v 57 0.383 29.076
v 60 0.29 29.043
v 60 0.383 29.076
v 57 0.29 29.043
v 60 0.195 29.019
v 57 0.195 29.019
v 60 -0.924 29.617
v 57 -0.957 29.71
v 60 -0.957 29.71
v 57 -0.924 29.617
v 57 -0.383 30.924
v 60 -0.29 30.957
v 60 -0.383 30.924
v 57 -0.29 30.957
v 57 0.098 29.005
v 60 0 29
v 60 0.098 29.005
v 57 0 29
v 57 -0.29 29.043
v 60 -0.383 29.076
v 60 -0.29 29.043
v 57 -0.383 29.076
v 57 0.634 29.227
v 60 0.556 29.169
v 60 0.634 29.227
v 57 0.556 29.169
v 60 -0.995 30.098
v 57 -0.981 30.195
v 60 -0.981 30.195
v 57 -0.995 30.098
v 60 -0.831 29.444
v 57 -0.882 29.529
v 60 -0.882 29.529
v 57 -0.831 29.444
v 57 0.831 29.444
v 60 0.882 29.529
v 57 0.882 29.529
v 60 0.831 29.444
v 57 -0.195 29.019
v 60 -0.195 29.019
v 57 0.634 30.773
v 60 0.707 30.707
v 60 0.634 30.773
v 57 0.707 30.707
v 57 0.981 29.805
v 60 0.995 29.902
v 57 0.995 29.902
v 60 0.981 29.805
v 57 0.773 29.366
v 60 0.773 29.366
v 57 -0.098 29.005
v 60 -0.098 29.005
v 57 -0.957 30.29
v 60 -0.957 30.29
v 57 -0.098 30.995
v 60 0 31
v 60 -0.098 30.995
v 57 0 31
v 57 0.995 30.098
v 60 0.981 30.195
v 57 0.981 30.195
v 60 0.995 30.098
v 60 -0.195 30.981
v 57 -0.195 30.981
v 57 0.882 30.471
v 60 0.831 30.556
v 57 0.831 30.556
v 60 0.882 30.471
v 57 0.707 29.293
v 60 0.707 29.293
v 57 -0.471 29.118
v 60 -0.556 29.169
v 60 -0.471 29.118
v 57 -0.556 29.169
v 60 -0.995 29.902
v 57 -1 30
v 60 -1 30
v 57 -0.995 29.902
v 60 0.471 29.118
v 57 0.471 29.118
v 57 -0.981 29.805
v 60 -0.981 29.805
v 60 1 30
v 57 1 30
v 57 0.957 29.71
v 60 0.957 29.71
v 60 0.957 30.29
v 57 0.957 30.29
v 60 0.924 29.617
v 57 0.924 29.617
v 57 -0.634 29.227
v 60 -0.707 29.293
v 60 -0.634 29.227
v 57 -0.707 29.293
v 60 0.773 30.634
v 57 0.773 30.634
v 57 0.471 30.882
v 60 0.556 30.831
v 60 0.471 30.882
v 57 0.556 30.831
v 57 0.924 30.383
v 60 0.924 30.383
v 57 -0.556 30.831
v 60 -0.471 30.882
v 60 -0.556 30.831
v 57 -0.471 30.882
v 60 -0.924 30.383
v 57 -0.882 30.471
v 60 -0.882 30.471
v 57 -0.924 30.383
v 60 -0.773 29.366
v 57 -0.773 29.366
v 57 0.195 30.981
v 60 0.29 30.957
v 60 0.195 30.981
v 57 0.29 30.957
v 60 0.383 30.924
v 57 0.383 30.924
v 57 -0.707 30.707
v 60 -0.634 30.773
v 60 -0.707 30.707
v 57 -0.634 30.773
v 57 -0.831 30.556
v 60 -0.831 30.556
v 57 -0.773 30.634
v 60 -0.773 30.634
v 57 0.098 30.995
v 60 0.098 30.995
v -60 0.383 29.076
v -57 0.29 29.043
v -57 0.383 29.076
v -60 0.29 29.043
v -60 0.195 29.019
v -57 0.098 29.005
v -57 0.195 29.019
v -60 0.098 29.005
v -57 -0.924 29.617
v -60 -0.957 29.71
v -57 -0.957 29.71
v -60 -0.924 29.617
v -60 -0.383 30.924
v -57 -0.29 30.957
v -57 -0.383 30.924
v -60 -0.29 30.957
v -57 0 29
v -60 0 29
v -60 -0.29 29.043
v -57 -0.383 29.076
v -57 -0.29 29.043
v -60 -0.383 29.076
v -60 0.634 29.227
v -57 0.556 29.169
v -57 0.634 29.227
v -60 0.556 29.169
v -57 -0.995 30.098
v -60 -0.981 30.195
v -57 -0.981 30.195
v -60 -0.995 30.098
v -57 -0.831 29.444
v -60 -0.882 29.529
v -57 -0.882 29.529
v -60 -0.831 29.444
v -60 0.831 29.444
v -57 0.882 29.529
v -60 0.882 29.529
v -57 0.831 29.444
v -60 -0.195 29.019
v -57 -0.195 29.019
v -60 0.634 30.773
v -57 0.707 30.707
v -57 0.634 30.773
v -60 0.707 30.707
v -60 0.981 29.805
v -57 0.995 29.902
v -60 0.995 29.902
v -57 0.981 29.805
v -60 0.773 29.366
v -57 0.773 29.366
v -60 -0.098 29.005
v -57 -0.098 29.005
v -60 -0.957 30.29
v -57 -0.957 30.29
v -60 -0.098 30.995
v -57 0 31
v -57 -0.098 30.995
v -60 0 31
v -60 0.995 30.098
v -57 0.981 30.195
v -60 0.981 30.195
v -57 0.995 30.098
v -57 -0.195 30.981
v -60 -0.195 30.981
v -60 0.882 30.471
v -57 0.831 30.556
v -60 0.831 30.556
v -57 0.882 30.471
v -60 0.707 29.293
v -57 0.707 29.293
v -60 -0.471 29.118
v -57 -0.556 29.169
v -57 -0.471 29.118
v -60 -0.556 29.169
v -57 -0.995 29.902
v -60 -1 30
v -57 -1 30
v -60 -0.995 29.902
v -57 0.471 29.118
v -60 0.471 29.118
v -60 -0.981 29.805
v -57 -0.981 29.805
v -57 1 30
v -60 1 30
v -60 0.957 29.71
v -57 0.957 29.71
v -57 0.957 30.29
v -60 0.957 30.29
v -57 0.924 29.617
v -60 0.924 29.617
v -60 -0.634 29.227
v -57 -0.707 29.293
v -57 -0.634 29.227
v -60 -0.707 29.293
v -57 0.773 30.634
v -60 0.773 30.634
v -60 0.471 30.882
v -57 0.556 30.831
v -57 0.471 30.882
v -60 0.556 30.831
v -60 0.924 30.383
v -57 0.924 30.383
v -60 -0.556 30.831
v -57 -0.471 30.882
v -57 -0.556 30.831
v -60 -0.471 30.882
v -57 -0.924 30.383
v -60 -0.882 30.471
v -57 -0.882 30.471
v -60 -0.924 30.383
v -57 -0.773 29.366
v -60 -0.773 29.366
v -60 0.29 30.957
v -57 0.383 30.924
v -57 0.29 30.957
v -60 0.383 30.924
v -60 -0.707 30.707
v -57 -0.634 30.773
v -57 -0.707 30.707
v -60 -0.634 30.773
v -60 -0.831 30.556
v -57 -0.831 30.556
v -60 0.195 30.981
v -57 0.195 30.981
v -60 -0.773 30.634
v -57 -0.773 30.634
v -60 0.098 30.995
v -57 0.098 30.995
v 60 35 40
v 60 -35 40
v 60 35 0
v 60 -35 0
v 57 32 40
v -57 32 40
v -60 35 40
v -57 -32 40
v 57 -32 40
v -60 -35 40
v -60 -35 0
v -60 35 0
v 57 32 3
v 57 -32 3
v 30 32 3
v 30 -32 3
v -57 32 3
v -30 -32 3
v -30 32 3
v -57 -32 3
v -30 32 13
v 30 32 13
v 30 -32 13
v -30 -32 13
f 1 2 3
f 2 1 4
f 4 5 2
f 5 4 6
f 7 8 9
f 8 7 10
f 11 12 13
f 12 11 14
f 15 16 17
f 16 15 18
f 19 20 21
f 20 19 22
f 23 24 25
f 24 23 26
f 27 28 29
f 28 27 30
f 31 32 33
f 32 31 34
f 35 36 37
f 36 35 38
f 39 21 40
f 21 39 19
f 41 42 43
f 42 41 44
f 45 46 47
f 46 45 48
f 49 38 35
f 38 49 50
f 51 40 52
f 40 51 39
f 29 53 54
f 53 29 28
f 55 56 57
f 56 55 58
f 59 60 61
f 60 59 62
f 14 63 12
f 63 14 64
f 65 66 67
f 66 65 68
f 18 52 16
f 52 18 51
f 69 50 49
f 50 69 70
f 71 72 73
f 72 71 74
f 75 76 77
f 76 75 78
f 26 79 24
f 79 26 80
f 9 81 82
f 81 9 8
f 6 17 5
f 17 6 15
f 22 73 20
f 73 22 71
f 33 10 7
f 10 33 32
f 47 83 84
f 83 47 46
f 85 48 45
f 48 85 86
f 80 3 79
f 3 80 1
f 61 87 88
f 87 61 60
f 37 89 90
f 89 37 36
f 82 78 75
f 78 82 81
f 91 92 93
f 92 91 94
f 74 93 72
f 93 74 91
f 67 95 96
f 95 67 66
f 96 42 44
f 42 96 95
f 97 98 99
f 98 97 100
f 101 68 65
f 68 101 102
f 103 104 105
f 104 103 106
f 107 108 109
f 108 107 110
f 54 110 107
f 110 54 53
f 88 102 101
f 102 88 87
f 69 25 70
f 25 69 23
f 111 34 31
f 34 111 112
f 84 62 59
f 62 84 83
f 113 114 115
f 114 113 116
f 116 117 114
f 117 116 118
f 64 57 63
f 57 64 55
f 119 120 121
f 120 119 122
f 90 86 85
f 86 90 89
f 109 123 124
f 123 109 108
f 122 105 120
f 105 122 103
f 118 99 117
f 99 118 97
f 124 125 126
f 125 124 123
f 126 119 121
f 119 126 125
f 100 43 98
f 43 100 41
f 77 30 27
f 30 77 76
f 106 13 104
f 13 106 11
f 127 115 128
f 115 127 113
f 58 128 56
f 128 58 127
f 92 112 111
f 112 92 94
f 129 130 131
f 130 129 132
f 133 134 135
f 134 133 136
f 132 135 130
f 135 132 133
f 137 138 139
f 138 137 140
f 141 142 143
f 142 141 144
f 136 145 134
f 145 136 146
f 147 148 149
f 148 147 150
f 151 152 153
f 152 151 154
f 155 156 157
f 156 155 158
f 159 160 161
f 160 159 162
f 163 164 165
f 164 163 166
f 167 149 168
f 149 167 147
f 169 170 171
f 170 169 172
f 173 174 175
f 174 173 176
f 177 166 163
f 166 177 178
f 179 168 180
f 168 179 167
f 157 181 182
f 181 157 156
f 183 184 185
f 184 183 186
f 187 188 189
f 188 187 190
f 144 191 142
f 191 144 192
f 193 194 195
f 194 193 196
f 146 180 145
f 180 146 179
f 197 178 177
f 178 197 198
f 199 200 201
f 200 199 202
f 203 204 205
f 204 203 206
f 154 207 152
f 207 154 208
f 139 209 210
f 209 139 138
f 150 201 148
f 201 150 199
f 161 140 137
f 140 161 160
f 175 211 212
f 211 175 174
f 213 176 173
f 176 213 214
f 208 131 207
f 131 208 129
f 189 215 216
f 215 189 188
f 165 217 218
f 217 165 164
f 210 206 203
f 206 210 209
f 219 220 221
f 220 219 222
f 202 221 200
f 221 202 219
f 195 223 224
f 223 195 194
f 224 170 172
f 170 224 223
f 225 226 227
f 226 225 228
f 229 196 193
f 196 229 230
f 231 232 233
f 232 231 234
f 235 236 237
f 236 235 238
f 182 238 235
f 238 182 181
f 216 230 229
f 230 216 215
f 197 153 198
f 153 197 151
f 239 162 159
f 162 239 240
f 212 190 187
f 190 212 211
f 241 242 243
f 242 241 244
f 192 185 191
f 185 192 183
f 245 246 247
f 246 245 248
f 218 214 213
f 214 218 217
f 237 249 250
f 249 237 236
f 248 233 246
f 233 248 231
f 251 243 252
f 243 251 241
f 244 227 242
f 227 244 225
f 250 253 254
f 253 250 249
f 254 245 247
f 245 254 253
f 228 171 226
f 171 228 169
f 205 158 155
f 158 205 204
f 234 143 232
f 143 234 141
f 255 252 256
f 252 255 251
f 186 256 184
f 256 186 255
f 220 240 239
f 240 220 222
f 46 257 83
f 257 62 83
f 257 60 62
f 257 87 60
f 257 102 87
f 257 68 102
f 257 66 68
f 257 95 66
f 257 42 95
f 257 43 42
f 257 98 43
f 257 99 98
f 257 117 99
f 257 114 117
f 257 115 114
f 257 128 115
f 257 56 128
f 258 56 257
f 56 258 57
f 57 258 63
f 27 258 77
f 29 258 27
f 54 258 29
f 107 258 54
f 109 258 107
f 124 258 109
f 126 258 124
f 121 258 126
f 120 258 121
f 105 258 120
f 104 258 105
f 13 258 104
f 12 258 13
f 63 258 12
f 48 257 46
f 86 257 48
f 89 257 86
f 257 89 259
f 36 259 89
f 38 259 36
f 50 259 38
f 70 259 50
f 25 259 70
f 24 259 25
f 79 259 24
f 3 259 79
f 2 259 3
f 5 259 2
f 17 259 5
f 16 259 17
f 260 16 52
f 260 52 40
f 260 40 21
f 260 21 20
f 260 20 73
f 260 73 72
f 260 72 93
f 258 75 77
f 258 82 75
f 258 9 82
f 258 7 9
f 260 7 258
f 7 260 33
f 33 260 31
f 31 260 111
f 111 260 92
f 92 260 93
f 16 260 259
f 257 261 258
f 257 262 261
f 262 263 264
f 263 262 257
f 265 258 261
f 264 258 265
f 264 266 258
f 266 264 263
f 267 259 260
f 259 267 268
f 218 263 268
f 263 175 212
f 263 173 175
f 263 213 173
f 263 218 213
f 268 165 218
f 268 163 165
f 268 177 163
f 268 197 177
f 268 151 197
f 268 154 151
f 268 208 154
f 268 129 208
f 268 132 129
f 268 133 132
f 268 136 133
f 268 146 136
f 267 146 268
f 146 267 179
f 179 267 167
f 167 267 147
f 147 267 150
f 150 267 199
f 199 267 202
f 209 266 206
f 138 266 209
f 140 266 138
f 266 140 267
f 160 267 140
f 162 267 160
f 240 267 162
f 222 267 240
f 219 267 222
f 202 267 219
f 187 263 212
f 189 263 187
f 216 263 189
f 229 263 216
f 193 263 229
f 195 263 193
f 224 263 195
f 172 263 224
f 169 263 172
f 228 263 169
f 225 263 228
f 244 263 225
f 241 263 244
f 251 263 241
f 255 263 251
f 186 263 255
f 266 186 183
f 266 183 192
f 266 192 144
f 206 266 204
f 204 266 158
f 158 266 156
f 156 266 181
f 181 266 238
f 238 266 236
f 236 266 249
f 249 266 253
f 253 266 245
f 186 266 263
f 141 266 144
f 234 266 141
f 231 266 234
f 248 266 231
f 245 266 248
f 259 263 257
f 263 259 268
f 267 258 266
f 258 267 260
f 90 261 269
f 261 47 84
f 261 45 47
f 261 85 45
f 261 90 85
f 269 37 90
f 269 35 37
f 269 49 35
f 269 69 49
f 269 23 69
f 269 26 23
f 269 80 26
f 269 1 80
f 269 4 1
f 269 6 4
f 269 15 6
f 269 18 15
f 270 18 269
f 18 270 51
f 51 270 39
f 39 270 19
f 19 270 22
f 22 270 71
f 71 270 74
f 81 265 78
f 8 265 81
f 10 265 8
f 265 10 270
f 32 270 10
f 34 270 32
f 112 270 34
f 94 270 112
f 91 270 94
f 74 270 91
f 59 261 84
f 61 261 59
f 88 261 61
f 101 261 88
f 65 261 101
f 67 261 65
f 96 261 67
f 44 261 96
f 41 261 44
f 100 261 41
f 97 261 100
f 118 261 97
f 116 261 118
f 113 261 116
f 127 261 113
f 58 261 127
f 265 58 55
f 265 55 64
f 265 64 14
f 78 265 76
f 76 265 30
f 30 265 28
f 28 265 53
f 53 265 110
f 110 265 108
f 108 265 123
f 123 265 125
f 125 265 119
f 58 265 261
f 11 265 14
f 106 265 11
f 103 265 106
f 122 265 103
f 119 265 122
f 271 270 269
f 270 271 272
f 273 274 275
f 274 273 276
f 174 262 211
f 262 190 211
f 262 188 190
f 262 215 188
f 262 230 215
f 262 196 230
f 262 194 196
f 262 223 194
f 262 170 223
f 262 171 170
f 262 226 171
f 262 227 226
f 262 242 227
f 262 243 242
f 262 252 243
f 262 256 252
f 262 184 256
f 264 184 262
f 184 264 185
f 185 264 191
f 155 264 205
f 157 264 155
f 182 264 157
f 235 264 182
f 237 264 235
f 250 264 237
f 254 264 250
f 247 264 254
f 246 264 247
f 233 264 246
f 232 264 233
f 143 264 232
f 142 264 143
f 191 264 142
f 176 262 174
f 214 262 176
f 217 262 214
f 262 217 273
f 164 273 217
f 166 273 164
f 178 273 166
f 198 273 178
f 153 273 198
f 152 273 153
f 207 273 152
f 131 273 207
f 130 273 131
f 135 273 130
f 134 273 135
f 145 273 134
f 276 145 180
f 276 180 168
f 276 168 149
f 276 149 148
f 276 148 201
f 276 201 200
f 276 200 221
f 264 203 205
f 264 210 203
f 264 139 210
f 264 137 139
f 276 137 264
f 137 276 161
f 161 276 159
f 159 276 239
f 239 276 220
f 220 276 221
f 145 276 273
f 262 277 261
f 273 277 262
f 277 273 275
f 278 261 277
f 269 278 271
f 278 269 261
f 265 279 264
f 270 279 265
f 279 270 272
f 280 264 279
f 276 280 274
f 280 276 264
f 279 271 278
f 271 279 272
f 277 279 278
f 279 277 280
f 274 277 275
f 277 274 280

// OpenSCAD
// Parameters (mm)
outer_x   = 120;   // outer length (X)
outer_y   = 70;    // outer width  (Y)
outer_z   = 40;    // outer height (Z)
wall_thk  = 3;    // wall thickness
floor_thk = 3;    // floor thickness

inner_x   = outer_x - 2*wall_thk;          // inner cavity length
inner_y   = outer_y - 2*wall_thk;          // inner cavity width
inner_z   = outer_z - floor_thk;           // inner cavity height (from floor to top)

platform_len = 60;   // platform length (X) inside tank
platform_h   = 10;   // platform height above floor
platform_center_z = floor_thk + platform_h/2; // Z of platform centre

hole_d   = 2;        // electrode hole diameter
hole_r   = hole_d/2;
hole_y   = 0;        // hole centre Y
hole_z   = 30;       // hole centre Z
hole_extra = 1;      // extra length beyond each wall face (mm)

// Global resolution for curved shapes
$fn = 64;

// Outer tank – positioned so its bottom sits on Z = 0
module outer_tank() {
    translate([0, 0, outer_z/2])
        cube([outer_x, outer_y, outer_z], center = true);
}

// Inner cavity – to be removed from the outer tank
module inner_cavity() {
    translate([0, 0, floor_thk + inner_z/2])
        cube([inner_x, inner_y, inner_z], center = true);
}

// Raised platform for the gel tray (solid)
module platform() {
    translate([0, 0, platform_center_z])
        cube([platform_len, inner_y, platform_h], center = true);
}

// Electrode holes – two separate cylinders, each cutting through an end wall
module electrode_holes() {
    // Right (positive X) end wall
    translate([ outer_x/2 - wall_thk/2, hole_y, hole_z])
        rotate([0, 90, 0])
            cylinder(h = wall_thk + 2*hole_extra, r = hole_r, center = true);
    // Left (negative X) end wall
    translate([ -outer_x/2 + wall_thk/2, hole_y, hole_z])
        rotate([0, 90, 0])
            cylinder(h = wall_thk + 2*hole_extra, r = hole_r, center = true);
}

// Assemble the tank (outer minus inner cavity and electrode holes) and add platform
module tank_assembly() {
    difference() {
        outer_tank();
        inner_cavity();
        electrode_holes();
    }
}

// Final part
union() {
    tank_assembly();
    platform();
}
